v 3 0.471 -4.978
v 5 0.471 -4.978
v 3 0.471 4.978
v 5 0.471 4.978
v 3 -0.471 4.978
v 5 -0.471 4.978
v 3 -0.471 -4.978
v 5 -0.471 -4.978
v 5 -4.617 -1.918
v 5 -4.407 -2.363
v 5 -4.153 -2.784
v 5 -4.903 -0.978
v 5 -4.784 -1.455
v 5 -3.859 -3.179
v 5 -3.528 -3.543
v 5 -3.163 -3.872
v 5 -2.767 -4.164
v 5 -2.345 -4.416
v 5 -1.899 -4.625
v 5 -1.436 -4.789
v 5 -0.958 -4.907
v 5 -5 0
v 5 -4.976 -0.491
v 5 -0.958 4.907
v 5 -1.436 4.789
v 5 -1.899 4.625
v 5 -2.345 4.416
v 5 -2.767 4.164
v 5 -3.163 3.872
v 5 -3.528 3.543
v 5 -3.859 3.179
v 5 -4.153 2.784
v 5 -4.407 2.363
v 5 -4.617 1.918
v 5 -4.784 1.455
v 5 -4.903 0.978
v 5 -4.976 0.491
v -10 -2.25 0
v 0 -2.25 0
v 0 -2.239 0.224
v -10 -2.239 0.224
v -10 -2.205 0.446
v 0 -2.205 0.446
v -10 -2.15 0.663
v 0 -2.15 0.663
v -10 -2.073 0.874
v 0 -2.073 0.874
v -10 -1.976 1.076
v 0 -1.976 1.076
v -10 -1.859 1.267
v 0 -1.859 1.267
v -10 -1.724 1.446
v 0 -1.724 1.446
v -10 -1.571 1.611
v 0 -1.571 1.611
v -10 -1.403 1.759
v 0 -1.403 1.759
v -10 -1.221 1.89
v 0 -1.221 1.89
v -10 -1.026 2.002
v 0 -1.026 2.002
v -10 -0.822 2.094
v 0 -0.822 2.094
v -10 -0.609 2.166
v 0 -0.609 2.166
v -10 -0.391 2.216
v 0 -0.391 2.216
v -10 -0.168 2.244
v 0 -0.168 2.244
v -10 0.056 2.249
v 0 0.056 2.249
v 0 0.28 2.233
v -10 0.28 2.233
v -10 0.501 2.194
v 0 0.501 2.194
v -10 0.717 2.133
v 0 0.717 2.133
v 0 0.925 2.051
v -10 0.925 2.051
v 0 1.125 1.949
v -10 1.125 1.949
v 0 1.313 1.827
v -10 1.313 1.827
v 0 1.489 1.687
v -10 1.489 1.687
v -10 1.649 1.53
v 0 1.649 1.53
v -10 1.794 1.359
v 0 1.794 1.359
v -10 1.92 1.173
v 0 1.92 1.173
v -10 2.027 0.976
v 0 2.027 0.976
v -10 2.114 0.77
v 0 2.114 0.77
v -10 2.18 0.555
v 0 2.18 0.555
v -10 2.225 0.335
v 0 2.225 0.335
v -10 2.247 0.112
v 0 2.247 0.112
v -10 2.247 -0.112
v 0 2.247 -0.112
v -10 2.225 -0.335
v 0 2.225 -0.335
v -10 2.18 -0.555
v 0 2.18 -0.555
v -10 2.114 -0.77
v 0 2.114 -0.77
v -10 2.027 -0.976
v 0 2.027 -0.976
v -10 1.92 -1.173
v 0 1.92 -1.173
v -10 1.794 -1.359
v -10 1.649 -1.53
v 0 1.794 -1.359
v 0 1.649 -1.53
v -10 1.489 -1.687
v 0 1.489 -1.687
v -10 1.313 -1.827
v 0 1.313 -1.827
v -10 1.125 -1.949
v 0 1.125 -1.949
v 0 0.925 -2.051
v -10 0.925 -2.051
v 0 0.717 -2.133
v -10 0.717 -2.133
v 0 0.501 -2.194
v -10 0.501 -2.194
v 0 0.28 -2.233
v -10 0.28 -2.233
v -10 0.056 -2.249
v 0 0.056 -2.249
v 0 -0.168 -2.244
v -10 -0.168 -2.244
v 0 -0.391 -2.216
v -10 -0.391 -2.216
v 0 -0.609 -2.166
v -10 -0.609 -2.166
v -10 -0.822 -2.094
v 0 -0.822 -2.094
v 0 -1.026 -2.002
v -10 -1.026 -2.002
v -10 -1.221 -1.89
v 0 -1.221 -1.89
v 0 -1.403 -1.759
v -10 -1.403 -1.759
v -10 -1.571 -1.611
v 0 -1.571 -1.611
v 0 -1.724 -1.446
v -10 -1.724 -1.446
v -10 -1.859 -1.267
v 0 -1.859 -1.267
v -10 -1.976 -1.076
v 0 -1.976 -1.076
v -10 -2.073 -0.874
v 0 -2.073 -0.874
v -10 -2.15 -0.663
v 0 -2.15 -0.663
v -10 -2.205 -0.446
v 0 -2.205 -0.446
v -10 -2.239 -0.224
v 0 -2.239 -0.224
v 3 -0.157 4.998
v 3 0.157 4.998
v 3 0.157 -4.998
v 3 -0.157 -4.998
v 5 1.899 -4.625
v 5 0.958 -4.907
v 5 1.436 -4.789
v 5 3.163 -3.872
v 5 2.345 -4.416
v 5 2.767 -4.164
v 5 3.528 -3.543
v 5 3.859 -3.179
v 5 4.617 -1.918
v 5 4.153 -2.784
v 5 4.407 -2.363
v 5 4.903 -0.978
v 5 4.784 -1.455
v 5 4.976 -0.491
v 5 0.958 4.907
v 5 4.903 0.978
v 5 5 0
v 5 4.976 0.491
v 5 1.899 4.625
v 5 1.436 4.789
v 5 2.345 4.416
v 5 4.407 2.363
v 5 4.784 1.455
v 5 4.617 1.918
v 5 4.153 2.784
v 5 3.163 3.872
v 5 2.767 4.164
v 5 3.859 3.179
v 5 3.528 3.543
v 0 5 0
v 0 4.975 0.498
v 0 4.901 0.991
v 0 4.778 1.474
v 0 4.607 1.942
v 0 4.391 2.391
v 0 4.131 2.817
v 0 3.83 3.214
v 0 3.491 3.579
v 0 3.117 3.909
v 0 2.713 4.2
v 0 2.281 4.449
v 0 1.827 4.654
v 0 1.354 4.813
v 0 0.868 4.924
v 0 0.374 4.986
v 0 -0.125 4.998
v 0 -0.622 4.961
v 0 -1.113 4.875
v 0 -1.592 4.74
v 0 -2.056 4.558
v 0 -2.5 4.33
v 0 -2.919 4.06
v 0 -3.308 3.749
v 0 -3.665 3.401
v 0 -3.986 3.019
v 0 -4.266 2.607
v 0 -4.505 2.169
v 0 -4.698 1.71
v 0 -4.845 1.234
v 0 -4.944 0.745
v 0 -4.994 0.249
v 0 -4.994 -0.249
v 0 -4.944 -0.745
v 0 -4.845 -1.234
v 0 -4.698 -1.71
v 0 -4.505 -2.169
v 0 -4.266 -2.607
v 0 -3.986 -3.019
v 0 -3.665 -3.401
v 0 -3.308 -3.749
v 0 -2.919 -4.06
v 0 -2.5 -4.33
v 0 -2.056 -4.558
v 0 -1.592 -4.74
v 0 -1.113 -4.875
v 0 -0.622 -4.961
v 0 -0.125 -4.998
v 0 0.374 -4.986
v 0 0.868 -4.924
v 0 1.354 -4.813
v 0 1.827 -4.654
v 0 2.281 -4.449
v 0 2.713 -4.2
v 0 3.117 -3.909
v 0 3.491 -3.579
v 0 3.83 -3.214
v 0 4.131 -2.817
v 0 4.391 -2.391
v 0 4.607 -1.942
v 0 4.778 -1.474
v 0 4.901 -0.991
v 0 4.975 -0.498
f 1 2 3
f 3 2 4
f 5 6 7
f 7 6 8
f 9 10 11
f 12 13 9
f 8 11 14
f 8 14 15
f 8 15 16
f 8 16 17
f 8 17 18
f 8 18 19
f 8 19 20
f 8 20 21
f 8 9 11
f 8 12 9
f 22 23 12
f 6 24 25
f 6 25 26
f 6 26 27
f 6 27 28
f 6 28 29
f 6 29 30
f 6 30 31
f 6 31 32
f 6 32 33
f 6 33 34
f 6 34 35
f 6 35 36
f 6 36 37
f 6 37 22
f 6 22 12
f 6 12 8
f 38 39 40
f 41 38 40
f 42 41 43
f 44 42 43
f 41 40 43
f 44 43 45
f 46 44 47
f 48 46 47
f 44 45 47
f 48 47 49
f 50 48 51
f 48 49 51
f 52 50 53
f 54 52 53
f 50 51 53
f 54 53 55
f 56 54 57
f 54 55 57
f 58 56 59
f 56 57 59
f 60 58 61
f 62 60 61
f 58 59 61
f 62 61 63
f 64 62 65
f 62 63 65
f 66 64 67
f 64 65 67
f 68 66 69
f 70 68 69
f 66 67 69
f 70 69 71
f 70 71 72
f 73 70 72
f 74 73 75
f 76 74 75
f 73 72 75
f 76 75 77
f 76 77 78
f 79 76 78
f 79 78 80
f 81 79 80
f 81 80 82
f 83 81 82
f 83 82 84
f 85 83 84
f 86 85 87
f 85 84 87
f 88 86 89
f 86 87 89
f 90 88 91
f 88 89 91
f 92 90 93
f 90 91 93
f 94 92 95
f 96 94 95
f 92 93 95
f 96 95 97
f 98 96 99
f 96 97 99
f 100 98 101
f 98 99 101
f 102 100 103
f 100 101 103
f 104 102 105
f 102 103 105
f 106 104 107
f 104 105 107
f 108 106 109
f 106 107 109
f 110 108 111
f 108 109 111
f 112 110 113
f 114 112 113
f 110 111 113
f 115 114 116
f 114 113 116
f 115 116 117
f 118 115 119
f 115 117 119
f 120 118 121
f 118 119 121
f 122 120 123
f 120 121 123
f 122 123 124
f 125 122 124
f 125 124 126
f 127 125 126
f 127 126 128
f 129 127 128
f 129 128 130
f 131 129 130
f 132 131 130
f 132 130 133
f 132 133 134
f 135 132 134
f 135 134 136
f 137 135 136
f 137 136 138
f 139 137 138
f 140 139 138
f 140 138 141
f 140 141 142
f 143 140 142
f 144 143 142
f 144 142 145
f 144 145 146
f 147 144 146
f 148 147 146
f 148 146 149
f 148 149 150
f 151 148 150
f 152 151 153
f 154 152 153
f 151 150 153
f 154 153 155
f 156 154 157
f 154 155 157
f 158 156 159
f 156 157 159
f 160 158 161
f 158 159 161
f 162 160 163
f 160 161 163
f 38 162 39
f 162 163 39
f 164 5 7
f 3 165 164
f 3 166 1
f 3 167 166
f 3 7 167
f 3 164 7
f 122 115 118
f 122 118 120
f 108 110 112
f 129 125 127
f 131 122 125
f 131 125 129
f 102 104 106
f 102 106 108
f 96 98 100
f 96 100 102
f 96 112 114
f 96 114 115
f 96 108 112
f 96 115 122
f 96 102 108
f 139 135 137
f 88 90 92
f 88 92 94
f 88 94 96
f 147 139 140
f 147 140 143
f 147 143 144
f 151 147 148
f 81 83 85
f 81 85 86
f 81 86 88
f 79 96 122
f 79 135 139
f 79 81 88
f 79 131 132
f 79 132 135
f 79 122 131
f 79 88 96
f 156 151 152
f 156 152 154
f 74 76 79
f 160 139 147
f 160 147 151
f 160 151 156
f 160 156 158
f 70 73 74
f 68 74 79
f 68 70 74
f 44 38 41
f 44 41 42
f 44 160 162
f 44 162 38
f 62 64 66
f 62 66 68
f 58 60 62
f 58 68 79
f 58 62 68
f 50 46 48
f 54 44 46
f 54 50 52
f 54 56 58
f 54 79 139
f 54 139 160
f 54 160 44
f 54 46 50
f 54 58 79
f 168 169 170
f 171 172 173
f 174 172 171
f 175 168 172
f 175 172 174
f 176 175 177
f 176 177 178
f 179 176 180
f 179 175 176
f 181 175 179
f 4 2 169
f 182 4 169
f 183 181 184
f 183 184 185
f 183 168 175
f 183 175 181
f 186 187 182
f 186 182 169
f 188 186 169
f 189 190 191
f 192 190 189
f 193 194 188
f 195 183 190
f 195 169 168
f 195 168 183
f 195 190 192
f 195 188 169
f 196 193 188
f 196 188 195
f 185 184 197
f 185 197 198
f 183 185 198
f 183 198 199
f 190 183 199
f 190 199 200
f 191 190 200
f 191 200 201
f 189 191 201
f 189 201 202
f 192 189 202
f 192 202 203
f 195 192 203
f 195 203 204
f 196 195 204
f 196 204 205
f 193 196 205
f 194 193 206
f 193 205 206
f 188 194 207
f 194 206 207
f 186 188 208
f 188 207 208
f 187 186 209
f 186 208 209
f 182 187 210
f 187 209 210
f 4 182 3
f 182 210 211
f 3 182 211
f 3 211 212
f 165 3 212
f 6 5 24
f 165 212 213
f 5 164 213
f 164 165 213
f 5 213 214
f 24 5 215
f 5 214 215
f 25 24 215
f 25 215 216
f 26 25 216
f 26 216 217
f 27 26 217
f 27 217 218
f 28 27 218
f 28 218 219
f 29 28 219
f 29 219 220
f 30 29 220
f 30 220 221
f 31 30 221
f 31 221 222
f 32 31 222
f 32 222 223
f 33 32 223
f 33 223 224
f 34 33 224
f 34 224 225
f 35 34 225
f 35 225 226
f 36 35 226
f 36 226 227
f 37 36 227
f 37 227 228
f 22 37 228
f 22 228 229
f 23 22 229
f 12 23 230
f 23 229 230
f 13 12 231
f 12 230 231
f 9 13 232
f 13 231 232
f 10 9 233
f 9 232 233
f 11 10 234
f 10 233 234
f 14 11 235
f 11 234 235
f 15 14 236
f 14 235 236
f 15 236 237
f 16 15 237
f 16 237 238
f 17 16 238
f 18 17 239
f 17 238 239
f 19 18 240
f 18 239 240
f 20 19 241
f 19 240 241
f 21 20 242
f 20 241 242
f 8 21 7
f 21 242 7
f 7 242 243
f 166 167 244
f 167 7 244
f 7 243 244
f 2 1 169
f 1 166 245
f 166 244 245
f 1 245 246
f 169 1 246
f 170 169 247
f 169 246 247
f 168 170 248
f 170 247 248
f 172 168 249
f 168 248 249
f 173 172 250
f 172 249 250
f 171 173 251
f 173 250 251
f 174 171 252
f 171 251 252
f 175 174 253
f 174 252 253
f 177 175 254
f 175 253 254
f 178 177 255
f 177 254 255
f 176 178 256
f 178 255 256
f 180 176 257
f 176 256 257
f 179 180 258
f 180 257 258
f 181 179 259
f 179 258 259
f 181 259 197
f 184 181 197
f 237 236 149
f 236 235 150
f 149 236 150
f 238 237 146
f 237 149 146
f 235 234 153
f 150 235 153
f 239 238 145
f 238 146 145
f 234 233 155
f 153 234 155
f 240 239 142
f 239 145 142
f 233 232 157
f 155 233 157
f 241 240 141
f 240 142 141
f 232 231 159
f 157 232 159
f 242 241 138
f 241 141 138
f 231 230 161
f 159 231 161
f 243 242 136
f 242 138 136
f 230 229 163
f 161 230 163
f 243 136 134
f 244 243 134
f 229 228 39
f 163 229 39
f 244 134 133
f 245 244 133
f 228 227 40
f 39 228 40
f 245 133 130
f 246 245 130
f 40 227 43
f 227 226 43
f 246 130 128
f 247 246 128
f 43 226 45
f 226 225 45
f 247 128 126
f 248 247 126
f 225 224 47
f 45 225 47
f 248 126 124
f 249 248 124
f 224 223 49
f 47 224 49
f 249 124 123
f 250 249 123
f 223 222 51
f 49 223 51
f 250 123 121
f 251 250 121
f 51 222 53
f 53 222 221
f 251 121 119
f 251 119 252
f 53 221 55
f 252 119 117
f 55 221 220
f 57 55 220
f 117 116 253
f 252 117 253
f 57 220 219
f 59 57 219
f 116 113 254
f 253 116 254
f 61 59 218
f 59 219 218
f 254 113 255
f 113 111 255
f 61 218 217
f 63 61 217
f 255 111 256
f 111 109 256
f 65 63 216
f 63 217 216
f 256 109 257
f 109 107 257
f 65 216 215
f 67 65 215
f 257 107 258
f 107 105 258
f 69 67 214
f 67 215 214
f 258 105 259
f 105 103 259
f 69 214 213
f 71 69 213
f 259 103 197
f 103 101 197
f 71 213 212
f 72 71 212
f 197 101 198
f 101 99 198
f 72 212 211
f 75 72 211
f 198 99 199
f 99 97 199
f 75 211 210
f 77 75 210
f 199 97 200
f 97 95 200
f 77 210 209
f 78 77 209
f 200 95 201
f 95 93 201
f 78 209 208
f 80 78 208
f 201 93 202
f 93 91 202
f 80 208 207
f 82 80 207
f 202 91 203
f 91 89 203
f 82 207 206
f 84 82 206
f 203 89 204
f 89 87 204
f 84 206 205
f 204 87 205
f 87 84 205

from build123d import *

# Parameters (mm, degrees)
F0_R     = 5
F1_DEPTH = 5
F2_R     = 2.25
F3_DEPTH = 10
F5_DEPTH = 2


with BuildPart() as f1:
    # F0 (on Right) → F1 (new body)
    with BuildSketch(Plane.YZ):
        Circle(F0_R)
    extrude(amount=F1_DEPTH)

    # F2 (on face) → F3 (join)
    with BuildSketch(Plane(origin=(0, 0, 0), x_dir=(0, -1, 0), z_dir=(-1, 0, 0))):
        Circle(F2_R)
    extrude(amount=F3_DEPTH)

    # F4 (on face) → F5 (cut)
    with BuildSketch(Plane.YZ.offset(5)):
        with BuildLine():
            Line((0.4713461094, 4.9777337057), (0.4713461094, 6.4907008782))
            Line((0.4713461094, 6.4907008782), (-0.4713461094, 6.4907008782))
            Line((-0.4713461094, 6.4907008782), (-0.4713461094, 4.9777337057))
            ThreePointArc((-0.4713461094, 4.9777337057), (0, 5), (0.4713461094, 4.9777337057))
        make_face()
        with BuildLine():
            Line((0.4713461094, -4.9777337057), (0.4713461094, 4.9777337057))
            ThreePointArc((0.4713461094, 4.9777337057), (0, 5), (-0.4713461094, 4.9777337057))
            Line((-0.4713461094, 4.9777337057), (-0.4713461094, -4.9777337057))
            ThreePointArc((-0.4713461094, -4.9777337057), (0, -5), (0.4713461094, -4.9777337057))
        make_face()
        with BuildLine():
            Line((0.4713461094, -6.4907008782), (0.4713461094, -4.9777337057))
            ThreePointArc((0.4713461094, -4.9777337057), (0, -5), (-0.4713461094, -4.9777337057))
            Line((-0.4713461094, -4.9777337057), (-0.4713461094, -6.4907008782))
            Line((-0.4713461094, -6.4907008782), (0.4713461094, -6.4907008782))
        make_face()
    extrude(amount=-F5_DEPTH, mode=Mode.SUBTRACT)


solid = f1.part
